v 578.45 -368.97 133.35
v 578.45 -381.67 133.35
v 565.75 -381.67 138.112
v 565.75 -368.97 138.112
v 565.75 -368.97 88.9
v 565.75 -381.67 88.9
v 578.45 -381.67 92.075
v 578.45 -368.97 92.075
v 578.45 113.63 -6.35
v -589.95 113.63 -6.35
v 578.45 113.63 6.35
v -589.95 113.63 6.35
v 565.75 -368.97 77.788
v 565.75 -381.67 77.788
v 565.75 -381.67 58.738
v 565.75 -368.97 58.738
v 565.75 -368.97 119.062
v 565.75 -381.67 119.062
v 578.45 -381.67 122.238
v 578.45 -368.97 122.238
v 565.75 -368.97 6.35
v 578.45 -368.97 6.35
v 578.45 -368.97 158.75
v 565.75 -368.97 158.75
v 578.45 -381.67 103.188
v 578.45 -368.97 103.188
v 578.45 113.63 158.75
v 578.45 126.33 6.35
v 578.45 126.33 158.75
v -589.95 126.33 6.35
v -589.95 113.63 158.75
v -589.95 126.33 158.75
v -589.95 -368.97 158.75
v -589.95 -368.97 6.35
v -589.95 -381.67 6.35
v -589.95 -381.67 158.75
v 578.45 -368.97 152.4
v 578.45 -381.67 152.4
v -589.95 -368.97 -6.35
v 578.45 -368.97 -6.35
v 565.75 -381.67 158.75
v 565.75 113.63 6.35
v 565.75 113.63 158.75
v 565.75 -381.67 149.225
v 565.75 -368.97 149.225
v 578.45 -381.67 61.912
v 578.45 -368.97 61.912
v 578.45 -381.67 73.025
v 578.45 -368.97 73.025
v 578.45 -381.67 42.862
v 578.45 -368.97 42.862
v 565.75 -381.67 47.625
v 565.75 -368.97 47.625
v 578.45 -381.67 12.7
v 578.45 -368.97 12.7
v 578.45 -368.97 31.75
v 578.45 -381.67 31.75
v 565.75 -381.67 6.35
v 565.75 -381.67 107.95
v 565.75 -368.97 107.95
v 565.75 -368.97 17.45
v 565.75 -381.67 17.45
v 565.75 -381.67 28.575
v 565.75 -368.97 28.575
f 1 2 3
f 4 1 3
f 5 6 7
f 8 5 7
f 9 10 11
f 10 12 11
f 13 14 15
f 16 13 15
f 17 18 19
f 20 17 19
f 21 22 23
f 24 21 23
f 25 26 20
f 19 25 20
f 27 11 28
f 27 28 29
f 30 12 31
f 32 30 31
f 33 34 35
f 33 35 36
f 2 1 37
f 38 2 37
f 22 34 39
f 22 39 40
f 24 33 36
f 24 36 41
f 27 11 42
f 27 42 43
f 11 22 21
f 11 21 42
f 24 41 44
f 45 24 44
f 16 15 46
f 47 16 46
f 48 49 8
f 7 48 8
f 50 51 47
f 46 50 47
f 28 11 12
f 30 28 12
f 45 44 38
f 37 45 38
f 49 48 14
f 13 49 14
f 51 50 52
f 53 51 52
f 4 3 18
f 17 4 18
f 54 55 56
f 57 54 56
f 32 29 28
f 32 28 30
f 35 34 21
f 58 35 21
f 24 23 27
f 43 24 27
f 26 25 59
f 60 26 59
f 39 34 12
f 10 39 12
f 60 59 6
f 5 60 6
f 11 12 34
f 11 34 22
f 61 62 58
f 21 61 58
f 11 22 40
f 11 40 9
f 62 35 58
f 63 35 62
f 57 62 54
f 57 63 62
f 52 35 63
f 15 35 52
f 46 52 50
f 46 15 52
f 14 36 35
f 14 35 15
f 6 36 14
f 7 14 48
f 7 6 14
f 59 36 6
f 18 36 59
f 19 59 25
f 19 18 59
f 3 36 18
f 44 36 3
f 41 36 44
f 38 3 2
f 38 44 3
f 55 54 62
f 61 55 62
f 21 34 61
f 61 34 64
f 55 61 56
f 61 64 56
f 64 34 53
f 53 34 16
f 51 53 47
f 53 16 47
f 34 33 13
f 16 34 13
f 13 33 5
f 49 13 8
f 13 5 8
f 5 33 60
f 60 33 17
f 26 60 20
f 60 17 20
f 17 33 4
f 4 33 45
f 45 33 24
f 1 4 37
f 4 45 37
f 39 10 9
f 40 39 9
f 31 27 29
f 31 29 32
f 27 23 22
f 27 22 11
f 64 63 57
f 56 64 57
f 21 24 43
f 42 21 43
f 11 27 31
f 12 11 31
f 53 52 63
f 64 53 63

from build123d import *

# Parameters (mm, degrees)
F0_W     = 1168.4
F0_H     = 482.6
F1_DEPTH = 6.35
F2_W     = 1168.4
F2_H     = 152.4
F3_DEPTH = 12.7
F4_W     = 1168.4
F4_H     = 152.4
F5_DEPTH = 12.7
F6_W     = 482.6
F6_H     = 152.4
F7_DEPTH = 12.7
F9_DEPTH = 12.7


with BuildPart() as f1:
    # F0 (on Top) → F1 (new body, symmetric)
    with BuildSketch(Plane.XY):
        with Locations((-5.750306, -127.670162)):
            Rectangle(F0_W, F0_H)
    extrude(amount=F1_DEPTH, both=True)


with BuildPart() as f3:
    # F2 (on face) → F3 (new body)
    with BuildSketch(Plane.XZ.offset(368.970162)):
        with Locations((-5.750306, 82.55)):
            Rectangle(F2_W, F2_H)
    extrude(amount=F3_DEPTH)

    # F8 (on face) → F9 (cut)
    with BuildSketch(Plane.XZ.offset(381.670162)):
        Polygon((565.749694, 158.75), (565.749694, 149.225), (578.449694, 152.4), (578.449694, 158.75), align=None)
        Polygon((578.449694, 122.2375), (578.449694, 133.35), (565.749694, 138.1125), (565.749694, 119.0625), align=None)
        Polygon((578.449694, 92.075), (578.449694, 103.1875), (565.749694, 107.95), (565.749694, 88.9), align=None)
        Polygon((578.449694, 61.9125), (578.449694, 73.025), (565.749694, 77.7875), (565.749694, 58.7375), align=None)
        Polygon((578.449694, 31.75), (578.449694, 42.8625), (565.749694, 47.625), (565.749694, 28.575), align=None)
        Polygon((578.449694, 12.7), (565.749694, 17.4498), (565.749694, 6.35), (578.449694, 6.35), align=None)
    extrude(amount=-F9_DEPTH, mode=Mode.SUBTRACT)


with BuildPart() as f5:
    # F4 (on face) → F5 (new body)
    with BuildSketch(Plane(origin=(0, 113.629838, 0), x_dir=(-1, 0, 0), z_dir=(0, 1, 0))):
        with Locations((5.750306, 82.55)):
            Rectangle(F4_W, F4_H)
    extrude(amount=F5_DEPTH)


with BuildPart() as f7:
    # F6 (on face) → F7 (new body)
    with BuildSketch(Plane.YZ.offset(578.449694)):
        with Locations((-127.670162, 82.55)):
            Rectangle(F6_W, F6_H)
    extrude(amount=-F7_DEPTH)


solid = Compound([f1.part, f3.part, f5.part, f7.part])
